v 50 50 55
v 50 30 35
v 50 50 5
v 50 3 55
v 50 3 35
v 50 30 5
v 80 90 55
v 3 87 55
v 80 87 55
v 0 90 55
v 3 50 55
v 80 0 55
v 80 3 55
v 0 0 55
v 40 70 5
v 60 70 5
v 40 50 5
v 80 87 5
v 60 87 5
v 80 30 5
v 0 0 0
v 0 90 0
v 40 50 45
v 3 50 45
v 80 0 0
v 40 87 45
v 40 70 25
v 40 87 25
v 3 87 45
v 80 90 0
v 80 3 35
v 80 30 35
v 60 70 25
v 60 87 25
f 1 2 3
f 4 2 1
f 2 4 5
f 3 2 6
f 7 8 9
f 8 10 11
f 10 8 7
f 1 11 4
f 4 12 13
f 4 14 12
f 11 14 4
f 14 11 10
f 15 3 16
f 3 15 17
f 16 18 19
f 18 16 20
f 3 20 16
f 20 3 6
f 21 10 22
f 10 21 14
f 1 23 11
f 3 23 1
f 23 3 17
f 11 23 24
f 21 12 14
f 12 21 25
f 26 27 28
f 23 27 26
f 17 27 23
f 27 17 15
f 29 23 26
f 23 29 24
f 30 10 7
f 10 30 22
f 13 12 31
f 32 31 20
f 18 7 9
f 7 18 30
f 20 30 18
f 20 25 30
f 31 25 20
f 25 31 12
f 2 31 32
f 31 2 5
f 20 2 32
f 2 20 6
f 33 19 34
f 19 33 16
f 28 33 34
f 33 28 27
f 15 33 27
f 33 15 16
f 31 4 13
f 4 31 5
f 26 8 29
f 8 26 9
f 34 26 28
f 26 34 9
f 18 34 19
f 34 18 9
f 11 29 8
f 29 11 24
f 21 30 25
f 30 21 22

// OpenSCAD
//4 Block Showcase

//Cube 1 Width
Cube1Width = 50;

//Cube 1 Length
Cube1Length = 50;

//Cube 1 Height
Cube1Height = 50;


//Cube 2 Width
Cube2Width = 40;

//Cube 2 Length
Cube2Length = 40;

//Cube 2 Height
Cube2Height = 40;


//Cube 3 Width
Cube3Width = 30;

//Cube 3 Length
Cube3Length = 30;

//Cube 3 Height
Cube3Height = 30;


//Cube 4 Width
Cube4Width = 20;

//Cube 4 Length
Cube4Length = 20;

//Cube 4 Height
Cube4Height = 20;


//Bottom Thickness
BottomThickness = 5;

//Length Of Wall
LengthOfWall = 3;

//4 Cubes
translate([0,0,BottomThickness]){
    //Cube 1
    color("red")
    cube([Cube1Width,Cube1Length,Cube1Height]);

    //Cube 2
    color("orange")
    translate([0,Cube1Length,0]){
        cube([Cube2Width,Cube2Length,Cube2Height]);
    }

    //Cube 3
    color("yellow")
    translate([Cube1Width,0,0]){
        cube([Cube3Width,Cube3Length,Cube3Height]);
    }
    
    //Cube 4
    color("green")
    translate([Cube2Width,(Cube1Length+Cube2Length)-Cube4Length,0]){
        cube([Cube4Width,Cube4Length,Cube4Height]);
    }
    
    //Wall 1
    color("blue")
    translate([Cube1Width,0,Cube3Height]){
        cube([Cube3Width,LengthOfWall,Cube1Height-Cube3Height]);
    }
    
    //Wall 2
    color("purple")
    translate([Cube2Width,(Cube1Length+Cube2Length)-LengthOfWall,Cube4Height]){
        cube([Cube4Width,LengthOfWall,Cube2Height-Cube4Height]);
    }
    
    //Wall 3
    color("pink")
    translate([0,Cube1Length,Cube2Height]){
        cube([LengthOfWall,Cube2Length,Cube1Height-Cube2Height]);
    }
    
    //Wall 4
    color("gold")
    translate([LengthOfWall,(Cube1Length+Cube2Length)-LengthOfWall,Cube2Height]){
        cube([(Cube1Width+Cube3Width)-LengthOfWall,LengthOfWall,Cube1Height-Cube2Height]);
    }
    
    //Wall 5
    color("saddlebrown")
    translate([Cube2Width+Cube4Width,(Cube1Length+Cube2Length)-LengthOfWall,0]){
        cube([(Cube1Width+Cube3Width)-(Cube2Width+Cube4Width),LengthOfWall,Cube2Height]);
    }
}

//Base
    color("grey")
    cube([Cube1Width+Cube3Width,Cube1Length+Cube2Length,BottomThickness]);
